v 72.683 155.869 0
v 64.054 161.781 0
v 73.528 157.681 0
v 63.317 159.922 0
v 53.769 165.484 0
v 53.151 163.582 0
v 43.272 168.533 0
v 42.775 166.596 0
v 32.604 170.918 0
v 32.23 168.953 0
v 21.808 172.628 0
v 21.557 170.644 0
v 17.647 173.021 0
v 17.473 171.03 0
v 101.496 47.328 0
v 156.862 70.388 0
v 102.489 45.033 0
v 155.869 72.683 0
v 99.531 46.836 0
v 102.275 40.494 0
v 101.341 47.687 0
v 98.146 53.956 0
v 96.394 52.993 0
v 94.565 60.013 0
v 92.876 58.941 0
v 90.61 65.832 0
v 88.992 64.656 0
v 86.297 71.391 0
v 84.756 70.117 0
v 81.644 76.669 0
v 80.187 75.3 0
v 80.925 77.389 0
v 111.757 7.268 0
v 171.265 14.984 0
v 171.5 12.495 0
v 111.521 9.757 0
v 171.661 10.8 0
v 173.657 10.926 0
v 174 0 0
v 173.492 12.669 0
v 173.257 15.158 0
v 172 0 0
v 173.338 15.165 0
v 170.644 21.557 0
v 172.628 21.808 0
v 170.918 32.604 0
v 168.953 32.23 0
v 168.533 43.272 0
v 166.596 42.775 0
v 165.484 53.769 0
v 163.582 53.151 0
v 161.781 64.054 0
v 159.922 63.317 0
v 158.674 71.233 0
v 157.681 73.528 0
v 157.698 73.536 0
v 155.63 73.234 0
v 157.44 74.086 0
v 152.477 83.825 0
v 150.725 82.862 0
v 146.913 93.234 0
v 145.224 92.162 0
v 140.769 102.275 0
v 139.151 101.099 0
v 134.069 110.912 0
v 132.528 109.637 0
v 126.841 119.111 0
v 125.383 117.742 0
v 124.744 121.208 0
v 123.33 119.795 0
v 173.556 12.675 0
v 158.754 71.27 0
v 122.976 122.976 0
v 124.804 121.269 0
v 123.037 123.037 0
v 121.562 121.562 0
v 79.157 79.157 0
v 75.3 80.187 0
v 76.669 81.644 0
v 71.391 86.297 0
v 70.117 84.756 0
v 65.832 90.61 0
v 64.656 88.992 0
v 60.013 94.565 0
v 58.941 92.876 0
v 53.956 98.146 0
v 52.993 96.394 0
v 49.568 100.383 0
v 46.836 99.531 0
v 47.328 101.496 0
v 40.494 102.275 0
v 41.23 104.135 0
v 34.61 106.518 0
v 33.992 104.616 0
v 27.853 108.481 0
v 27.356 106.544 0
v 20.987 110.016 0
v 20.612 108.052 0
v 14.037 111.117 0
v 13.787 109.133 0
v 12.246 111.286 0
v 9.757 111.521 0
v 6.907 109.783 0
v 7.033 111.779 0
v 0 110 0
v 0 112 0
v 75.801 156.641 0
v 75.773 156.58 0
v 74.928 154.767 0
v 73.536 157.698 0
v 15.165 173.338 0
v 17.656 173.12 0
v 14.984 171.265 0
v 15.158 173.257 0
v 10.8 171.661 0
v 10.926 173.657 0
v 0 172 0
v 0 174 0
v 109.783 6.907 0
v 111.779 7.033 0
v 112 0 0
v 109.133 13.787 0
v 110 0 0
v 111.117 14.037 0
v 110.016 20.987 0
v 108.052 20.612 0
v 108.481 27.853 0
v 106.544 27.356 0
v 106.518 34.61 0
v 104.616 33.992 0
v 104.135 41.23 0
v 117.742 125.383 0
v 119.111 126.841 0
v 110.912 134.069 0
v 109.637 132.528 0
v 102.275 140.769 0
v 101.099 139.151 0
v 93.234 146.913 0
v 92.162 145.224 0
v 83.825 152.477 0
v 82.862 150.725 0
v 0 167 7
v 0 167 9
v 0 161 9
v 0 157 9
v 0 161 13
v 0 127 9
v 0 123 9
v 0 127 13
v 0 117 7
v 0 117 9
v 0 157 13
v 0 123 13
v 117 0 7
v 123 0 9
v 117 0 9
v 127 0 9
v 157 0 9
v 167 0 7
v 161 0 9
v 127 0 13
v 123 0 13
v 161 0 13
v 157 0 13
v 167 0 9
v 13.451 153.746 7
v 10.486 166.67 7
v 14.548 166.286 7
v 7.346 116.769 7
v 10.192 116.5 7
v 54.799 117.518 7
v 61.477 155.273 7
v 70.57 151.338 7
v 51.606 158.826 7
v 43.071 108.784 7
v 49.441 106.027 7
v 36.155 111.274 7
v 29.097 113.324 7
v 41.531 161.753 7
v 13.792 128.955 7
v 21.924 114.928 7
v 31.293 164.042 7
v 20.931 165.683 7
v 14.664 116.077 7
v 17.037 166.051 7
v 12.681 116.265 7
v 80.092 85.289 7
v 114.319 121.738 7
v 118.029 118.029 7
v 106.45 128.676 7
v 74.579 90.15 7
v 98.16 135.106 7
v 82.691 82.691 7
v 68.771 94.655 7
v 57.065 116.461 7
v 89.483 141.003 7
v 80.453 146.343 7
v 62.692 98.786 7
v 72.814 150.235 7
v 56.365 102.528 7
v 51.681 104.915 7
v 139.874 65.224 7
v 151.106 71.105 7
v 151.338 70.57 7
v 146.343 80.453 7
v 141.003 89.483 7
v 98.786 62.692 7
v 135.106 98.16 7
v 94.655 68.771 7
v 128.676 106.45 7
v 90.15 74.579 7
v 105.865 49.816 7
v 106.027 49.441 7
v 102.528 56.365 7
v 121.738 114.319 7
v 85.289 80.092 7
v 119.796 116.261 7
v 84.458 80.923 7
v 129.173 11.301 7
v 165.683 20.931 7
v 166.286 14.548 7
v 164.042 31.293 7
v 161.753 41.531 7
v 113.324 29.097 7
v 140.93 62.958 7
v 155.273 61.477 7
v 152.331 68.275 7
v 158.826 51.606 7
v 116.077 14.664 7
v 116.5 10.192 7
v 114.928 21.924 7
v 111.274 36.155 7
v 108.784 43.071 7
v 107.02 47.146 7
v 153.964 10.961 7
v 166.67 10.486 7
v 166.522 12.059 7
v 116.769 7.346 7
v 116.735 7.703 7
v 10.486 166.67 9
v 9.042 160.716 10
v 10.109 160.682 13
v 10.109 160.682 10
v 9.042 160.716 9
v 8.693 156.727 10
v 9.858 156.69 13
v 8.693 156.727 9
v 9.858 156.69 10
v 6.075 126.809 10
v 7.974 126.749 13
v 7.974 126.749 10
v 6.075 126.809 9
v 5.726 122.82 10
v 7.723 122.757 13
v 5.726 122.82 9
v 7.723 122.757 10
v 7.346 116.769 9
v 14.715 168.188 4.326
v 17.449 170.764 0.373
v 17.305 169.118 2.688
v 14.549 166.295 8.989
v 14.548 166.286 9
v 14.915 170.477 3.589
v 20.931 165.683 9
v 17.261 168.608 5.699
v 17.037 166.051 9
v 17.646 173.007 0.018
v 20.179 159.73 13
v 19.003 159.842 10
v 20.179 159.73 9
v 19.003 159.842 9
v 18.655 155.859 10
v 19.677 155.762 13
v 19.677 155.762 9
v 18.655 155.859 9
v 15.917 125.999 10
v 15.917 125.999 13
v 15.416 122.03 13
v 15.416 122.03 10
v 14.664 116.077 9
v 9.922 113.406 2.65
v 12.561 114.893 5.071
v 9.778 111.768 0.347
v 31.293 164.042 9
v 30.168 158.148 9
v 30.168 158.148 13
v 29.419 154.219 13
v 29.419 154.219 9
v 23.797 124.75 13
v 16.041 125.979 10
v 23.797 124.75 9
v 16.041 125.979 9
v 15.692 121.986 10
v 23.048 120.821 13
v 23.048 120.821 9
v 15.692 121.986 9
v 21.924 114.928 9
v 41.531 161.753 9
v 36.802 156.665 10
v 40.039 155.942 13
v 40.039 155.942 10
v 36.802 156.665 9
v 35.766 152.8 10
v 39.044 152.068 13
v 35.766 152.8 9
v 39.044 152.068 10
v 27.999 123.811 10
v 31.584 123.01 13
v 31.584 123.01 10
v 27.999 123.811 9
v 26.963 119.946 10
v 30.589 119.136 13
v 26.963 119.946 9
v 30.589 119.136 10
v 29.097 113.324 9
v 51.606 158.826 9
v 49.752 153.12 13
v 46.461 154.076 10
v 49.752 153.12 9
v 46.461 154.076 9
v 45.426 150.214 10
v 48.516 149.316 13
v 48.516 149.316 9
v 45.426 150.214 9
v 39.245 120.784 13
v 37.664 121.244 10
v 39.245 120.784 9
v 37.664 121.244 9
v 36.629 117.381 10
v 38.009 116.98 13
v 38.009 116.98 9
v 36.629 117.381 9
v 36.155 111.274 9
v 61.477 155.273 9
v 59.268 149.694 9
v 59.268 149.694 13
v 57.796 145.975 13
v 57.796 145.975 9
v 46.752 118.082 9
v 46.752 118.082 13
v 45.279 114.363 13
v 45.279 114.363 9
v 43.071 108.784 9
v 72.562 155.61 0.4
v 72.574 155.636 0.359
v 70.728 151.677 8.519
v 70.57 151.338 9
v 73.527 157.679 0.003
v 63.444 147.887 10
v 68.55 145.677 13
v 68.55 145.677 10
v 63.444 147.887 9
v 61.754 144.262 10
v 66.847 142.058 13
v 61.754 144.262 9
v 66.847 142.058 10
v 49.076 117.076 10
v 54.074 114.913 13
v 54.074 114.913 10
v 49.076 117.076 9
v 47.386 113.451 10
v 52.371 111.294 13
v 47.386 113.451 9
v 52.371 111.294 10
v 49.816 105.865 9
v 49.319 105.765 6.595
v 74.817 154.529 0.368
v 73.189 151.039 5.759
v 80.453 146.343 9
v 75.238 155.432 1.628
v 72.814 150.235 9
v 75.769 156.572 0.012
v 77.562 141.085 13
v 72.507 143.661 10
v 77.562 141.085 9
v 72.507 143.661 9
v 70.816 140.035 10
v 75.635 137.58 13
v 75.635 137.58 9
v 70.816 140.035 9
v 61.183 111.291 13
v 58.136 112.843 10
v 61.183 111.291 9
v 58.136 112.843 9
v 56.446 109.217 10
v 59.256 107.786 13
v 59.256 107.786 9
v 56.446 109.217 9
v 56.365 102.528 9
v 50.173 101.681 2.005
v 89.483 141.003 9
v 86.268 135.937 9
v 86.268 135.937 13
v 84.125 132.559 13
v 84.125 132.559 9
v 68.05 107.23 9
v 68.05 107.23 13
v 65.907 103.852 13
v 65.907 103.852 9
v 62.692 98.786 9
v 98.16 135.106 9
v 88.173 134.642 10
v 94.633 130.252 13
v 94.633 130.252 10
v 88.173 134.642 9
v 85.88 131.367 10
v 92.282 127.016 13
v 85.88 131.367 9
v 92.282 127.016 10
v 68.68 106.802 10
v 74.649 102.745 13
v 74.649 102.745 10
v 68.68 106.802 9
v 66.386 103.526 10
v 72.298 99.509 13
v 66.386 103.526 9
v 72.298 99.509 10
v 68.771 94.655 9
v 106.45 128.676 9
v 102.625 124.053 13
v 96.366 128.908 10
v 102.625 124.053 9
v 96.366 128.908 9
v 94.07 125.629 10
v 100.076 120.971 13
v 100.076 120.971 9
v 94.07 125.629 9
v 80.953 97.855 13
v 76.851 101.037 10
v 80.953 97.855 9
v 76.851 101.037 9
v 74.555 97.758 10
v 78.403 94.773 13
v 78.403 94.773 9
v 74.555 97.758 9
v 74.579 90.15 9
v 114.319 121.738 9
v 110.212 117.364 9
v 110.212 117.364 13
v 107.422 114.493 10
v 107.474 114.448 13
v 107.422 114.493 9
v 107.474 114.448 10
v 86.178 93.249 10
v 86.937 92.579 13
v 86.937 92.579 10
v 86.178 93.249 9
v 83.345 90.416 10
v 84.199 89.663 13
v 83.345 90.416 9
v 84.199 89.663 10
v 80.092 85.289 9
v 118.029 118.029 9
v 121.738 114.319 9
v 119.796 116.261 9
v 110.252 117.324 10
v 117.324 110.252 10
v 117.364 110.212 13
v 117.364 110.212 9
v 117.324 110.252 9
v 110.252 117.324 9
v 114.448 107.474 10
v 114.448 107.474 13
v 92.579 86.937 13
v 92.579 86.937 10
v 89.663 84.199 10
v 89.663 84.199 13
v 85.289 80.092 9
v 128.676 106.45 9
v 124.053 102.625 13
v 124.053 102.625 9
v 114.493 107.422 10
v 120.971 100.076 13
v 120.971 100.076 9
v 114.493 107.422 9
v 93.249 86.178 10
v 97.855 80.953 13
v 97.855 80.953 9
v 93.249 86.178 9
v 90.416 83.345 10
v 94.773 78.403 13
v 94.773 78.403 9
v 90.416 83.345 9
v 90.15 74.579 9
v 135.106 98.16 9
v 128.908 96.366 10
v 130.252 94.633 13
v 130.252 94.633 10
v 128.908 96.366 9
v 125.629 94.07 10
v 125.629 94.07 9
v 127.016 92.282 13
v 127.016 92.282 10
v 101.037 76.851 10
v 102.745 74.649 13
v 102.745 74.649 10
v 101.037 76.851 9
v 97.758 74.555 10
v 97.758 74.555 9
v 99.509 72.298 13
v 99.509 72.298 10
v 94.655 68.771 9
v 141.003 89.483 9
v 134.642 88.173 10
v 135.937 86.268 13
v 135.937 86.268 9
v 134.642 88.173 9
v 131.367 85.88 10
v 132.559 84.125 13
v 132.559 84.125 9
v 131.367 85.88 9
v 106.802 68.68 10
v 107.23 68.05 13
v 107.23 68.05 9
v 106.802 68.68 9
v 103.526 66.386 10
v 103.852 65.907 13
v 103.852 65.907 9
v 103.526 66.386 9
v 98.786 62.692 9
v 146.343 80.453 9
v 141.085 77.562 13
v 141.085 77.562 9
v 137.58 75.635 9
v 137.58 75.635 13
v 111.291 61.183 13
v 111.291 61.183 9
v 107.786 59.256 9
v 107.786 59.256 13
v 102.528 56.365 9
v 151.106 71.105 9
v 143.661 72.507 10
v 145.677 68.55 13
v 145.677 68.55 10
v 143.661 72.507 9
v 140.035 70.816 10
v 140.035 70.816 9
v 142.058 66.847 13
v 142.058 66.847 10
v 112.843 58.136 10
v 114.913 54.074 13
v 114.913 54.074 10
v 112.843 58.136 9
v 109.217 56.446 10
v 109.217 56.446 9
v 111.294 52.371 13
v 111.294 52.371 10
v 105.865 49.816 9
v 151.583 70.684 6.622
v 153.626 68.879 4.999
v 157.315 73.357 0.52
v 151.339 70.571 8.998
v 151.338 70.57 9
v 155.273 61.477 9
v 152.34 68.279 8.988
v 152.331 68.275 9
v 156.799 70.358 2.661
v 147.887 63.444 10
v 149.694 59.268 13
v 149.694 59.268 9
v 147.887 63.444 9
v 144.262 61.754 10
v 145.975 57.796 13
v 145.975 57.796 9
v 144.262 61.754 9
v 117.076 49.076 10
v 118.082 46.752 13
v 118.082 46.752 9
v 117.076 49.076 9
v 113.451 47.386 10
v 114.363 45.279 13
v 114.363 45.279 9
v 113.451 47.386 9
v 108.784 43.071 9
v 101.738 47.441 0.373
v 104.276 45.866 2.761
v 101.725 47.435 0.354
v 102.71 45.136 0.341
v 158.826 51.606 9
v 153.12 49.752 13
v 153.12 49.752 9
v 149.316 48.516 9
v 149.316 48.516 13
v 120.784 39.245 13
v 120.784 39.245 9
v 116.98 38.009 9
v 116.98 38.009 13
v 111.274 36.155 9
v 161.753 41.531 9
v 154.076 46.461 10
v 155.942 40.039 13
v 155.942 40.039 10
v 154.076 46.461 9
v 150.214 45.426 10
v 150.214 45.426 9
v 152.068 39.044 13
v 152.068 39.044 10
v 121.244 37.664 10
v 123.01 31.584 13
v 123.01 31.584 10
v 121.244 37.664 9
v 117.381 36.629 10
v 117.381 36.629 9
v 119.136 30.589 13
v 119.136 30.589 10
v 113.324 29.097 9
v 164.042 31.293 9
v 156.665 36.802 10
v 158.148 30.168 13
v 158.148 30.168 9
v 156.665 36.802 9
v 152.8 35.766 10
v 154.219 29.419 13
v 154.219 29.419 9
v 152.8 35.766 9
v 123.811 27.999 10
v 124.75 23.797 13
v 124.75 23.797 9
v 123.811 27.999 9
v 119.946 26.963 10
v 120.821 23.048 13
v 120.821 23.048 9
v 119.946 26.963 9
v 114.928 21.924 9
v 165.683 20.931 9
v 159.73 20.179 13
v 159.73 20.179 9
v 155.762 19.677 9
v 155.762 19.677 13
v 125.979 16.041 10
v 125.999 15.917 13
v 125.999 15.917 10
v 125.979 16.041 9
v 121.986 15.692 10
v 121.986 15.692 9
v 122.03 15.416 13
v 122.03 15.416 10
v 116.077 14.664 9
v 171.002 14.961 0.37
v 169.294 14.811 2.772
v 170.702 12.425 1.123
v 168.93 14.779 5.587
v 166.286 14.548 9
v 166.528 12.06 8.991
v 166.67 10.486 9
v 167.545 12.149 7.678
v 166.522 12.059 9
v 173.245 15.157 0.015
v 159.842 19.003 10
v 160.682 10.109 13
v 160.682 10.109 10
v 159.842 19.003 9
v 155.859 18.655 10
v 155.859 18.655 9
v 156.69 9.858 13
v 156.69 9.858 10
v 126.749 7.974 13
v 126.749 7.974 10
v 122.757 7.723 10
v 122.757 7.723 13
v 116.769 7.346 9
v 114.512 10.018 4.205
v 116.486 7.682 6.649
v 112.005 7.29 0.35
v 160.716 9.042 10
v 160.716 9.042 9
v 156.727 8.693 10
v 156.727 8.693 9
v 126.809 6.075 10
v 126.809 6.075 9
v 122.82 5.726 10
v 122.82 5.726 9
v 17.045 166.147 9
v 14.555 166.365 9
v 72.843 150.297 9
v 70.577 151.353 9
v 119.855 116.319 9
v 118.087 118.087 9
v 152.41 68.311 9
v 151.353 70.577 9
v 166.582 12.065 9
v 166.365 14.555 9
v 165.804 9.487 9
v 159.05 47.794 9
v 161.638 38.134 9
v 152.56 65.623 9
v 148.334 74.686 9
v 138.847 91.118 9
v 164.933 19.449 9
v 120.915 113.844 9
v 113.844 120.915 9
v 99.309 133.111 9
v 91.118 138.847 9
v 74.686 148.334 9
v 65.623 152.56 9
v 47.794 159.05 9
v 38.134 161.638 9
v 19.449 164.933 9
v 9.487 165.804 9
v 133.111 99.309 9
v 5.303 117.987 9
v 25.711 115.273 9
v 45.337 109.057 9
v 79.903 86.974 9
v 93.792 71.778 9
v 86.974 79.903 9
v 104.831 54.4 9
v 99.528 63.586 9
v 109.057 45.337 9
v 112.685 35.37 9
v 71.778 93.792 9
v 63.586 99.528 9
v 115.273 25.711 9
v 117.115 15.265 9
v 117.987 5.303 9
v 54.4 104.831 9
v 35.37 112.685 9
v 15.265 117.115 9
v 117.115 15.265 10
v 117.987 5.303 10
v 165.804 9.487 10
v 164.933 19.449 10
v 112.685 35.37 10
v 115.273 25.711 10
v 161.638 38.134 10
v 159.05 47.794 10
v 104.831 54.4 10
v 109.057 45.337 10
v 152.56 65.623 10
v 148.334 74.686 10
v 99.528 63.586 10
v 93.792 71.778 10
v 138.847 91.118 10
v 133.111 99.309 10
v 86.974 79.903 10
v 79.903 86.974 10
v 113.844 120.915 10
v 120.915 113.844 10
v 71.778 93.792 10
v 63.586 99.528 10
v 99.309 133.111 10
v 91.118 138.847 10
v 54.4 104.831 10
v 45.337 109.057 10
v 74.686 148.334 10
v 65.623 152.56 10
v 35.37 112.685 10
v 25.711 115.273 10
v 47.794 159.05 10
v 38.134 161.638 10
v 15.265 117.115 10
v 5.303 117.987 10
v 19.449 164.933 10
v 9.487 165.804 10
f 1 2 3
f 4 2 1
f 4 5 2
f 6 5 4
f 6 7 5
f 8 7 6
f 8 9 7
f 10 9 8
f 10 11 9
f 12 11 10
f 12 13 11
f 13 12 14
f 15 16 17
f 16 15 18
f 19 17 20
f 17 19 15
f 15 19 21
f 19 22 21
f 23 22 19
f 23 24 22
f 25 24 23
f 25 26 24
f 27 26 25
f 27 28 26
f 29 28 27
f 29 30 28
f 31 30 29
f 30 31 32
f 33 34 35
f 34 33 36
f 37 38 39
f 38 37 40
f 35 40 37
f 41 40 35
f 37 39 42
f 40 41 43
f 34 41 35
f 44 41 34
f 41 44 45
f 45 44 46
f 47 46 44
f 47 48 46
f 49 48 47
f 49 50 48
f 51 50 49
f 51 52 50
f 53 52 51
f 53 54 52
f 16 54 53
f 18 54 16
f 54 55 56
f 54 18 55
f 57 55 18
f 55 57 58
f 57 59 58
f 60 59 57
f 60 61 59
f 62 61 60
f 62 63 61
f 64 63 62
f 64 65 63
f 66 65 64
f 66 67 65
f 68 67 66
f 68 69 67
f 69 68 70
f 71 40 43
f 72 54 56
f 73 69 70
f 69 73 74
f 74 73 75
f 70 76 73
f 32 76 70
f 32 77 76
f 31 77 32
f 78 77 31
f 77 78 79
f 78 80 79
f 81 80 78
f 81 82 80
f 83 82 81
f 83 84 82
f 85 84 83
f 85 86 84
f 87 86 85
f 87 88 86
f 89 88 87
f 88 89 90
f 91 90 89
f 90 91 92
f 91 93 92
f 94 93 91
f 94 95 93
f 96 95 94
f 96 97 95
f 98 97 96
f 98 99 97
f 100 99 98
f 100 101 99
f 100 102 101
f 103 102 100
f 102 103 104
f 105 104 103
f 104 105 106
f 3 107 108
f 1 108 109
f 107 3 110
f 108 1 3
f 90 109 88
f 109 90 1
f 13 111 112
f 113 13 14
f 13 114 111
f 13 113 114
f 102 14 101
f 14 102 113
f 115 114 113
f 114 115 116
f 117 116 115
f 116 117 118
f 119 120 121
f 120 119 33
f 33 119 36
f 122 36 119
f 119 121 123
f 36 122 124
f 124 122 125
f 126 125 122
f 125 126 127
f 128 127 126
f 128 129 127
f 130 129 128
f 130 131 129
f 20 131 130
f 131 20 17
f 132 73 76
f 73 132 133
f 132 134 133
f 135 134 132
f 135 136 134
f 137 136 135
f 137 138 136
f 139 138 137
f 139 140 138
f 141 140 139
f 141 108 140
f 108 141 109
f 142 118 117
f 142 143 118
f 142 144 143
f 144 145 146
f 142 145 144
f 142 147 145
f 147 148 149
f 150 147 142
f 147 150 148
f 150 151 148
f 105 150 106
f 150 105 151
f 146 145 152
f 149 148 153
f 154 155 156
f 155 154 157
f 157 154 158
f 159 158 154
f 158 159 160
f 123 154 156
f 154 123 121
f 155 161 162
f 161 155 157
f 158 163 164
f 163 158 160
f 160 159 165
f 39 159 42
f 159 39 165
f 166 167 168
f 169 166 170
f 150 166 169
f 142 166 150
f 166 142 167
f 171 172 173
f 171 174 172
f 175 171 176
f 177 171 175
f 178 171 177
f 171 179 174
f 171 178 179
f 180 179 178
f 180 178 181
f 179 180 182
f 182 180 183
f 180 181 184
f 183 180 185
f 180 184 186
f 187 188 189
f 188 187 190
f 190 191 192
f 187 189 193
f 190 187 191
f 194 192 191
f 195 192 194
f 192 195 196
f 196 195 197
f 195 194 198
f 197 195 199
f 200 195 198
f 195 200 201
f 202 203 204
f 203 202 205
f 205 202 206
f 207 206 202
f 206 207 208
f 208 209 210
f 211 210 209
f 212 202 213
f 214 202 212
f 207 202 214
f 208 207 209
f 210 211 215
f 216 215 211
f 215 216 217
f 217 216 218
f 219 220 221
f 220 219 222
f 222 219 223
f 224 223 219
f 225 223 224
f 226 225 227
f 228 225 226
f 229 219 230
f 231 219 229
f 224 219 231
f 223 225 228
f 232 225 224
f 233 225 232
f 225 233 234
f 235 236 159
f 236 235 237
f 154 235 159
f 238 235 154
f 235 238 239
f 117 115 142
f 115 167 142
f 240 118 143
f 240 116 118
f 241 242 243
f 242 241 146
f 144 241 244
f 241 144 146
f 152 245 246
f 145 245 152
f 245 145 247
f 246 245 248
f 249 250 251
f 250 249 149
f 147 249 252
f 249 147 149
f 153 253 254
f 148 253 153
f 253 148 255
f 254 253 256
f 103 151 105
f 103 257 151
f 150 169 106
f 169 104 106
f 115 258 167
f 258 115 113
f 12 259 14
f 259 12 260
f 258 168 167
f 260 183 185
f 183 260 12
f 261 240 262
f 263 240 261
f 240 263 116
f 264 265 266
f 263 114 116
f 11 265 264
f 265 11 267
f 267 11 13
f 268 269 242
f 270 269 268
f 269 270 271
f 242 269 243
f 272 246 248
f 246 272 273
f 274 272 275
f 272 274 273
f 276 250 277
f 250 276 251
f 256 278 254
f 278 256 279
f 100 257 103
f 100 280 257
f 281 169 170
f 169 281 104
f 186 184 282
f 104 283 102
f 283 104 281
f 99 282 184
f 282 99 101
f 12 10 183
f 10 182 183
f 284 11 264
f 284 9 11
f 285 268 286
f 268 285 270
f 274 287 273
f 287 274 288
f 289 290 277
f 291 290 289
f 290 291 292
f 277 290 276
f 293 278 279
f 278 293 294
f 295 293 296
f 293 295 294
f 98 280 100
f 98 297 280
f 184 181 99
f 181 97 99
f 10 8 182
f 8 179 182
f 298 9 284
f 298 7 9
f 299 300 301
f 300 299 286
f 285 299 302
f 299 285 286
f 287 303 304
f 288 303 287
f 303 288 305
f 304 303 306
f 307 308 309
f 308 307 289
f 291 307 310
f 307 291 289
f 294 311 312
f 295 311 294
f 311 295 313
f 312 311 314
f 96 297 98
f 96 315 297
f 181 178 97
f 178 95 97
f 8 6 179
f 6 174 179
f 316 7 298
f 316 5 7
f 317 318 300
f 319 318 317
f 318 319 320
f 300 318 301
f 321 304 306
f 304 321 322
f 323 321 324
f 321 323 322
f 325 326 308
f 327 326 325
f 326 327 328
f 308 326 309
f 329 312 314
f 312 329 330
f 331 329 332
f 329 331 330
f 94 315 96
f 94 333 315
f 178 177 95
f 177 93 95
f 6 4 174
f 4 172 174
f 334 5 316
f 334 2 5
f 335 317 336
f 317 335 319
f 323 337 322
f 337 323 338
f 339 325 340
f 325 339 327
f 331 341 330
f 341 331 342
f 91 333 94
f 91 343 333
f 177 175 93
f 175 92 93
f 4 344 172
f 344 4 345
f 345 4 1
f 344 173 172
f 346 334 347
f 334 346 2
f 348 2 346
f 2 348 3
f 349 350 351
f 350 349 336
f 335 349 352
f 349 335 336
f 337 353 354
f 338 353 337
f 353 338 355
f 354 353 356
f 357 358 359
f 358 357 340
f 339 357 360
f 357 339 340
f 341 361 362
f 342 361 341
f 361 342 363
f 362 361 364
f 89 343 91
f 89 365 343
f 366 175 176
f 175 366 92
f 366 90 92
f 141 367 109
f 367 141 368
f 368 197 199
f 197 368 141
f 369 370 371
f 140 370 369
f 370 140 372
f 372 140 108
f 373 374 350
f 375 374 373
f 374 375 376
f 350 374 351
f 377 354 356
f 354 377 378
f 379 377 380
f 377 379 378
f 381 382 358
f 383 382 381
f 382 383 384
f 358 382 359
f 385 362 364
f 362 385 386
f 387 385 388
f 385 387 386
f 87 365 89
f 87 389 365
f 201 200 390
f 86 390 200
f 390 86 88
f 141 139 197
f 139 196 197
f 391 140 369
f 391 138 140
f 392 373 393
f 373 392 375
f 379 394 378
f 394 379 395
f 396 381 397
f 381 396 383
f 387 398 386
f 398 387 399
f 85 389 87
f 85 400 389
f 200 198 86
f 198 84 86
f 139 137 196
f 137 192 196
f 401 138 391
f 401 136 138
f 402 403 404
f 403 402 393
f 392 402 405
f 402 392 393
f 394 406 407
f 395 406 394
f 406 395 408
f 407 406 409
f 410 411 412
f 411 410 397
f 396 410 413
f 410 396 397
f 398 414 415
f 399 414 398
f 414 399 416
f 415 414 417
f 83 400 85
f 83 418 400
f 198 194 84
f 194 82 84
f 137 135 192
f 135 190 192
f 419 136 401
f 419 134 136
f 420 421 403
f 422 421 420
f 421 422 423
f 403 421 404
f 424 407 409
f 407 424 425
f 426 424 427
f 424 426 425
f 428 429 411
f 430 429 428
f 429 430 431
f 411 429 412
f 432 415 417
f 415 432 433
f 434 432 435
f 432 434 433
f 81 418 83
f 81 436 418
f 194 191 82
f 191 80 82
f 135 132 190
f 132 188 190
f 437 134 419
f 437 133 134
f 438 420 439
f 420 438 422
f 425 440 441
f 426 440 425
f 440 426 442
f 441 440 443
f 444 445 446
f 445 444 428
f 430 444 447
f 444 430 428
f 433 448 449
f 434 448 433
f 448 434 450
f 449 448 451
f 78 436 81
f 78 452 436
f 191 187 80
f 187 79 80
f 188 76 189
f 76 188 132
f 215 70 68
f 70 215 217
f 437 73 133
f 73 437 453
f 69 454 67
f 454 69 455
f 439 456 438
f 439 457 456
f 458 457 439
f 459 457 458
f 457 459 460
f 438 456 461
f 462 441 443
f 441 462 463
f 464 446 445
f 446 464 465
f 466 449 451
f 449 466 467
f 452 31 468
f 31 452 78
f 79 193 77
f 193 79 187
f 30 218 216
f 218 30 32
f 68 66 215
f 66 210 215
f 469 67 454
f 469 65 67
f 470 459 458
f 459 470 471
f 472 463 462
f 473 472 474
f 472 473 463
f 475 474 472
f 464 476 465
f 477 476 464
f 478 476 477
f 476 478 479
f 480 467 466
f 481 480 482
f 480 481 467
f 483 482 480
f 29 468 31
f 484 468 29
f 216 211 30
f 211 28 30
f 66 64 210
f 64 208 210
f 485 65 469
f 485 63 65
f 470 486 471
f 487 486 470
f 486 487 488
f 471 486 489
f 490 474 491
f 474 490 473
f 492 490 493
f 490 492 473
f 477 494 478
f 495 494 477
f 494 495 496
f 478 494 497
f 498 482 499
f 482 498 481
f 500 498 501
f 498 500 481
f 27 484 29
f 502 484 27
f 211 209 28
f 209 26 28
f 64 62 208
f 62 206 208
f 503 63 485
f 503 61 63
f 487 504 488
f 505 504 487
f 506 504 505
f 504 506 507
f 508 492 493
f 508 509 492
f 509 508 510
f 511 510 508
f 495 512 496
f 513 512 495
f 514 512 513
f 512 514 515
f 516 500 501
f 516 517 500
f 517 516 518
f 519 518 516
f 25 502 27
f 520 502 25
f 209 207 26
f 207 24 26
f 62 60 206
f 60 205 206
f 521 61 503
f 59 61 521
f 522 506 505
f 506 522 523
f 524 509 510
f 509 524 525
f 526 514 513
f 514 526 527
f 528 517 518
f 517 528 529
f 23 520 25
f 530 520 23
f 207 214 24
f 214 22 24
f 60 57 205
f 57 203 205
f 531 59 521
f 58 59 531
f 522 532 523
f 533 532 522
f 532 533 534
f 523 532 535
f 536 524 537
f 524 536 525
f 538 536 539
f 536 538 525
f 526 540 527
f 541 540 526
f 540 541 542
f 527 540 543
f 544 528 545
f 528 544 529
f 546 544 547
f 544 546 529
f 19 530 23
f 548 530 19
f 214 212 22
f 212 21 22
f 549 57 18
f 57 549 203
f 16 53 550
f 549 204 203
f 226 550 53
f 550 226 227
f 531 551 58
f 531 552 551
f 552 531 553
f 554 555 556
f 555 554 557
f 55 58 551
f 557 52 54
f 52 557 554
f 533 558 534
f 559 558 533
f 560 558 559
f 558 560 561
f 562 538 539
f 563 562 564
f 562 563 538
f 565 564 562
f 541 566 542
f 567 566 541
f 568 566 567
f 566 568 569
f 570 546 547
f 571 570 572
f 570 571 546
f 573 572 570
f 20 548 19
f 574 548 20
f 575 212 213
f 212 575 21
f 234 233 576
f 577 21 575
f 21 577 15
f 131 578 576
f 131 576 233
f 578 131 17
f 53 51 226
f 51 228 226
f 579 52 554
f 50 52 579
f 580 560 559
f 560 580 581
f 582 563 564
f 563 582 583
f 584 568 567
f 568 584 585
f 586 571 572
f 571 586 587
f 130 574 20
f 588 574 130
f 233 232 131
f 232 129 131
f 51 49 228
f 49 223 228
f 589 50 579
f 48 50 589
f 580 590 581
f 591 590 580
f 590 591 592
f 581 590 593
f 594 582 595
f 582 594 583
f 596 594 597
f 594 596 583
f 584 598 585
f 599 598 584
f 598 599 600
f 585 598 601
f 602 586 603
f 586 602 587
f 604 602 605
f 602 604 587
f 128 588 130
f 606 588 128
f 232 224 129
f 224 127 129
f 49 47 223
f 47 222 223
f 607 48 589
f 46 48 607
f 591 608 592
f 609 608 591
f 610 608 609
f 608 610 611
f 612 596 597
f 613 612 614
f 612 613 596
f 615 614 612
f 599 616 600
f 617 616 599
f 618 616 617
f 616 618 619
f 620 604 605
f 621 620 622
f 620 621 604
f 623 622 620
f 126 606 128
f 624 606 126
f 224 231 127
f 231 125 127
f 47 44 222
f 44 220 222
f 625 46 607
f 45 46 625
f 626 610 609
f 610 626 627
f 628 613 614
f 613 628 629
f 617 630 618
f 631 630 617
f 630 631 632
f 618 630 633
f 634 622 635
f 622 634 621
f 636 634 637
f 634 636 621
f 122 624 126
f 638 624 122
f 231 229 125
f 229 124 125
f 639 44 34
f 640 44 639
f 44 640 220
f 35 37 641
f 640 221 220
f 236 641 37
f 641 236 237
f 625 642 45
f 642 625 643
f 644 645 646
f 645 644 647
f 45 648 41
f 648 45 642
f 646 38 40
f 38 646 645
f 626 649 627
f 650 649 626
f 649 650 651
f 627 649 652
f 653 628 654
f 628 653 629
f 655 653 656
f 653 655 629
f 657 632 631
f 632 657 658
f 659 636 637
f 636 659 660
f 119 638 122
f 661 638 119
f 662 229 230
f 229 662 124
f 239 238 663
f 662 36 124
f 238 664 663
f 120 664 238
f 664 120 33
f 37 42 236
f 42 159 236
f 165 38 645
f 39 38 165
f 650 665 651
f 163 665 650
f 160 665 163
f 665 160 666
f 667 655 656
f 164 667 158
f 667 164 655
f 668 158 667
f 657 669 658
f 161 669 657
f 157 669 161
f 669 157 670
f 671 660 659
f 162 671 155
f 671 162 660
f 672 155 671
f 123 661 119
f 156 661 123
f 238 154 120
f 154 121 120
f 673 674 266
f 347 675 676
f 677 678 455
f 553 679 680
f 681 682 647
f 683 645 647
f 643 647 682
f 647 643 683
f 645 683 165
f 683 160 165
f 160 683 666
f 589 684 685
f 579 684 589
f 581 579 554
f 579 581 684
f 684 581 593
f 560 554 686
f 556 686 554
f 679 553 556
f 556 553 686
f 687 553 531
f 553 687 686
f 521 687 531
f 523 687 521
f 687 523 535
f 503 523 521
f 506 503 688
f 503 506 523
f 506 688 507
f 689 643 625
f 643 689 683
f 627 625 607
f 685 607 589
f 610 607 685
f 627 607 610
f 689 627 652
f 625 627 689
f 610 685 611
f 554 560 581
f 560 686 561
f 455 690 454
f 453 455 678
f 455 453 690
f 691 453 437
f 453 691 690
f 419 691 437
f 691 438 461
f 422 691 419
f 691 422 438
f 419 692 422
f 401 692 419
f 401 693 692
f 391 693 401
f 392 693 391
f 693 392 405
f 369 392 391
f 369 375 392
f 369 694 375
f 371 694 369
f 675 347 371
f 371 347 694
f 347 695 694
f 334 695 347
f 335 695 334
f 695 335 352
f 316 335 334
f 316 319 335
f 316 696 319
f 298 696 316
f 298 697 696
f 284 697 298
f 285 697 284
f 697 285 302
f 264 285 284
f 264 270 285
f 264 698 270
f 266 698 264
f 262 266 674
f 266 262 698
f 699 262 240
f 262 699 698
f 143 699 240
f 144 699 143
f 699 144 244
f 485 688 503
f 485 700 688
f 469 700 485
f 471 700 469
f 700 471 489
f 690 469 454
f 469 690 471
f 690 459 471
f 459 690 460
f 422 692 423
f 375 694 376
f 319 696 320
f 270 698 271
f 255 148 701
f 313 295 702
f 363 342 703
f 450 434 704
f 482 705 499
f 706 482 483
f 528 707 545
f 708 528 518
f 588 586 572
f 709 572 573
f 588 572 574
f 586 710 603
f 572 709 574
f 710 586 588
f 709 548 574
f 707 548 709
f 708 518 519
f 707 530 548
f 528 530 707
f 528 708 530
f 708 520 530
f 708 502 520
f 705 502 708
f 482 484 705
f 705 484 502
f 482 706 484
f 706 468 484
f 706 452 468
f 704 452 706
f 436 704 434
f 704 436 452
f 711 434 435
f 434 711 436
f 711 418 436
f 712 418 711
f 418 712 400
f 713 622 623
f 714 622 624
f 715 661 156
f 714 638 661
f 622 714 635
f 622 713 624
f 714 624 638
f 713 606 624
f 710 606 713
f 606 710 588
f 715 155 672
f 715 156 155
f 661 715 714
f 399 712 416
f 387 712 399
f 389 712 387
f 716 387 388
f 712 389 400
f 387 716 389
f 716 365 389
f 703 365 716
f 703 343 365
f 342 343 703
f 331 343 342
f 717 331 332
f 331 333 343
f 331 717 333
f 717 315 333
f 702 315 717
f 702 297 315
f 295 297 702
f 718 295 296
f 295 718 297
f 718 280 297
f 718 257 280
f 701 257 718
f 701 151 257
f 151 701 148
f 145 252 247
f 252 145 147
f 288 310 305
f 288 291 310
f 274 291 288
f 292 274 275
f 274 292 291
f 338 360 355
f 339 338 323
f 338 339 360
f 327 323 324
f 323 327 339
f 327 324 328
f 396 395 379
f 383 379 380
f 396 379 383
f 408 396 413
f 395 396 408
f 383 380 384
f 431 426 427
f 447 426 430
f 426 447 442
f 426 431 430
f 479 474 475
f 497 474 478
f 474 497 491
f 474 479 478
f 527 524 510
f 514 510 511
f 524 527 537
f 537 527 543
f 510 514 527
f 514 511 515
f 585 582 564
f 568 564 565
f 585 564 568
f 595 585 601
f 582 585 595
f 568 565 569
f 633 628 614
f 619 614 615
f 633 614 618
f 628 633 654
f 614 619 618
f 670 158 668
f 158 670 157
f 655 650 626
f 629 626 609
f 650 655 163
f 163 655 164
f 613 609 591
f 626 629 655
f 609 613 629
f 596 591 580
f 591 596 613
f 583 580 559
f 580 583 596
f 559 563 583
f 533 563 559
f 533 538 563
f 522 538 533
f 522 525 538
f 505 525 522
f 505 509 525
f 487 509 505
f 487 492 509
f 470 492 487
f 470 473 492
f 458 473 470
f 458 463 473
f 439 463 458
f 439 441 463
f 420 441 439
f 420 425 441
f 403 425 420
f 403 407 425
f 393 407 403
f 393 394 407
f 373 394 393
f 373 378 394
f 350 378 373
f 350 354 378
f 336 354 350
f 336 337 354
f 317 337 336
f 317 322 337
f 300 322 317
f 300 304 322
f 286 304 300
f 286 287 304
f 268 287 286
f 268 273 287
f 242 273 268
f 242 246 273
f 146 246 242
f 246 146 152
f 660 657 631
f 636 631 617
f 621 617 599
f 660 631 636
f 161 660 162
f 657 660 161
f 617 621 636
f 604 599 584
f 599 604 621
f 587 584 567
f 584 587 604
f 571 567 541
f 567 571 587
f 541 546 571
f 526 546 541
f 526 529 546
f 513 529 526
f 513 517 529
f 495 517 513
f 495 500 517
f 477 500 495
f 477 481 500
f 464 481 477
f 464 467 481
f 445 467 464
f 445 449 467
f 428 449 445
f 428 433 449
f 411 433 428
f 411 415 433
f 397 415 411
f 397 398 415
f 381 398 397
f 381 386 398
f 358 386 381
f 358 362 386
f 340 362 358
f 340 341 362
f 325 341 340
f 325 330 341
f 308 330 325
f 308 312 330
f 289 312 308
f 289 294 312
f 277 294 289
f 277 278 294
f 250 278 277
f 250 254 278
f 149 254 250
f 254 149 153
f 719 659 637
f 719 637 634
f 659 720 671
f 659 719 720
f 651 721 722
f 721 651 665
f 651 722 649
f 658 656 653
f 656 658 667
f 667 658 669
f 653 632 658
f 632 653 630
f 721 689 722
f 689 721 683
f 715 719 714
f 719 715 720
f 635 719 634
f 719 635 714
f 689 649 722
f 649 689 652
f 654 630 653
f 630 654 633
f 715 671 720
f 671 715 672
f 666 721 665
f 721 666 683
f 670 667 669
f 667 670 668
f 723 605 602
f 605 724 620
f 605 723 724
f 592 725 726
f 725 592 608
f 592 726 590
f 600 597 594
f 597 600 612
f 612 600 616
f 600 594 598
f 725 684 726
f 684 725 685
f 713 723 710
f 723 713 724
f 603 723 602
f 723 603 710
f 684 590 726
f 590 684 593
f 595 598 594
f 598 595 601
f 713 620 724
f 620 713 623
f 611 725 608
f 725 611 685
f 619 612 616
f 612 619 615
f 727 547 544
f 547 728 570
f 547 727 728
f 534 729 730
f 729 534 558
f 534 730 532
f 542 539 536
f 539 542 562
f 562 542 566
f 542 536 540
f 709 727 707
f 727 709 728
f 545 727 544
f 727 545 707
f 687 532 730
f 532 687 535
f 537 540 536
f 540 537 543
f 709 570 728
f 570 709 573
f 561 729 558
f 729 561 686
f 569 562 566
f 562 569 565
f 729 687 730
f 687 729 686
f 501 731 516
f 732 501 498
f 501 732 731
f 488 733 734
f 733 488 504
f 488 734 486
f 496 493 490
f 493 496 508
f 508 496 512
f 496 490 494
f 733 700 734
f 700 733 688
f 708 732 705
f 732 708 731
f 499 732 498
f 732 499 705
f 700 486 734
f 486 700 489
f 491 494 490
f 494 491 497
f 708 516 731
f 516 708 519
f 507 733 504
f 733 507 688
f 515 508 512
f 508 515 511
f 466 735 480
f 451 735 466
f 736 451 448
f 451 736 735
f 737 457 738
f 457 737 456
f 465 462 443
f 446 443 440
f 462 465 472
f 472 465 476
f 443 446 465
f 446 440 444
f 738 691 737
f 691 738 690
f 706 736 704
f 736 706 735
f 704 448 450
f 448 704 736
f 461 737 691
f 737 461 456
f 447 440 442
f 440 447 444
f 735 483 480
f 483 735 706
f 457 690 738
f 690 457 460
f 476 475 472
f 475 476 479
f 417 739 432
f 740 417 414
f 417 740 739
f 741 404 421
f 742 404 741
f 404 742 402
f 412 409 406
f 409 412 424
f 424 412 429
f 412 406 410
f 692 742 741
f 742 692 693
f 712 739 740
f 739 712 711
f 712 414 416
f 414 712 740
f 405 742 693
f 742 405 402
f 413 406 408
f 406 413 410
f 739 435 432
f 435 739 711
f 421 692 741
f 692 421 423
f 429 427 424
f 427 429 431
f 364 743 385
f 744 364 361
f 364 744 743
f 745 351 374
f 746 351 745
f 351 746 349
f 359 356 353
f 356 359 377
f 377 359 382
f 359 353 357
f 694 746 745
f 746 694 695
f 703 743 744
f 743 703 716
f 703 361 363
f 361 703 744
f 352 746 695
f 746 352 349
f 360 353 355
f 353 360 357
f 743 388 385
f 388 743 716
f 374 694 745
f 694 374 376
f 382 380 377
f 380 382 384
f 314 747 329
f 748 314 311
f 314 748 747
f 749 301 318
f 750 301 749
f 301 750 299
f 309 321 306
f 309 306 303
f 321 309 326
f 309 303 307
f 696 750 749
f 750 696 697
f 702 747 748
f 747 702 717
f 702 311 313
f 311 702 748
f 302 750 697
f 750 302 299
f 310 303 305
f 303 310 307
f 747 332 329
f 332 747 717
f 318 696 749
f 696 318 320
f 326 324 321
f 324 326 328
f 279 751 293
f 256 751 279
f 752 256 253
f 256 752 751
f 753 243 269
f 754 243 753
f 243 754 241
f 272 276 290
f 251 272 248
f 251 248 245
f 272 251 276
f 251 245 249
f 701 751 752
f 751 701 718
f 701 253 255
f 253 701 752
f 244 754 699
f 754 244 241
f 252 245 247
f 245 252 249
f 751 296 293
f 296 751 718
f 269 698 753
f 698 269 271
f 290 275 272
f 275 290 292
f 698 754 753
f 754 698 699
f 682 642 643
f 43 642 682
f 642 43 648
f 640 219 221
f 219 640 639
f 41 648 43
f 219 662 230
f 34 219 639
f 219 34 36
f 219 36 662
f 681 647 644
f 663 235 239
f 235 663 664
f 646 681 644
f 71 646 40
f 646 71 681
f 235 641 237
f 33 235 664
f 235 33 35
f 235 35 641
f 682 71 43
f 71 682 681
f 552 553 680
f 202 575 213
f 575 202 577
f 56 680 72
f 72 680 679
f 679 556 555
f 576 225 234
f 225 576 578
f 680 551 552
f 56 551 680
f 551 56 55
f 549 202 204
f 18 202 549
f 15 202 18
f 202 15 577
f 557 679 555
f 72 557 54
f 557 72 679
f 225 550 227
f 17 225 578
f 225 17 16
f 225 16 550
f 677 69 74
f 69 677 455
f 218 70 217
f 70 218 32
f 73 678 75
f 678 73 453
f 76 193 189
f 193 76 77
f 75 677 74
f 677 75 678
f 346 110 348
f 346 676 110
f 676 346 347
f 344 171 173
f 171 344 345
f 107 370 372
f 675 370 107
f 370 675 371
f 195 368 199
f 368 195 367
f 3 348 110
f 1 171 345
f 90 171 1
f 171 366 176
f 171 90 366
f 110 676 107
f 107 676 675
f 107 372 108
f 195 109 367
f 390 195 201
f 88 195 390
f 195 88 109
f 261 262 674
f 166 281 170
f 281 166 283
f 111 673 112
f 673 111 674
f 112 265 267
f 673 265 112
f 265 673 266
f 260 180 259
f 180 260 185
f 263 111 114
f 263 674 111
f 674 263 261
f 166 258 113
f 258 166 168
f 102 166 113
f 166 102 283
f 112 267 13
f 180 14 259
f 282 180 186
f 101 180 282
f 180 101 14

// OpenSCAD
//
// Curved track, made to be compatible with Geotrax®
// (Work in progress : no join system between tracks)
// Author: Francois Crevola (francois@crevola.org)
//

// main piece
intersection() {
	// A "cube" to cut a quarter of the "rotate_extruded" 
	cube(size = [174, 174, 20], center = false);
	// rotate extrude of a rail profile defined by a polygom
	rotate_extrude(convexity= 10, $fn = 100)
		translate([142,0,0])
		polygon(points=[[0,7],[-25,7],[-30,0],[-32,0],[-25,9],[-19,9],[-19,13],[-15,13],[-15,9],[15,9],[15,13],[19,13],[19,9],[25,9],[32,0],[30,0],[25,7]], paths=[[0,1,2,3,4,5,6,7,8,9,10,11,12,13,14,15,16,17,18,19,20]]);
}

// + traverses
for (a = [5,15,25,35,45,55,65,75,85]) // n iterations
{
	rotate([0,0,a])
	translate([118, -5, 9])
	cube(size = [48, 10, 1], center = false);
}

// + supports
for (a = [5,25,45,65,85]) // n iterations
{
	rotate([0,0,a])
	translate([142,0,0])
	rotate([90,0,0])
	linear_extrude(height=2.5)
		polygon(points=[[-32,0],[-25,9],[25,9],[32,0]], paths=[[0,1,2,3,4,5,6,7,8,9,10,11,12,13,14,15,16,17,18,19,20]]);
}
